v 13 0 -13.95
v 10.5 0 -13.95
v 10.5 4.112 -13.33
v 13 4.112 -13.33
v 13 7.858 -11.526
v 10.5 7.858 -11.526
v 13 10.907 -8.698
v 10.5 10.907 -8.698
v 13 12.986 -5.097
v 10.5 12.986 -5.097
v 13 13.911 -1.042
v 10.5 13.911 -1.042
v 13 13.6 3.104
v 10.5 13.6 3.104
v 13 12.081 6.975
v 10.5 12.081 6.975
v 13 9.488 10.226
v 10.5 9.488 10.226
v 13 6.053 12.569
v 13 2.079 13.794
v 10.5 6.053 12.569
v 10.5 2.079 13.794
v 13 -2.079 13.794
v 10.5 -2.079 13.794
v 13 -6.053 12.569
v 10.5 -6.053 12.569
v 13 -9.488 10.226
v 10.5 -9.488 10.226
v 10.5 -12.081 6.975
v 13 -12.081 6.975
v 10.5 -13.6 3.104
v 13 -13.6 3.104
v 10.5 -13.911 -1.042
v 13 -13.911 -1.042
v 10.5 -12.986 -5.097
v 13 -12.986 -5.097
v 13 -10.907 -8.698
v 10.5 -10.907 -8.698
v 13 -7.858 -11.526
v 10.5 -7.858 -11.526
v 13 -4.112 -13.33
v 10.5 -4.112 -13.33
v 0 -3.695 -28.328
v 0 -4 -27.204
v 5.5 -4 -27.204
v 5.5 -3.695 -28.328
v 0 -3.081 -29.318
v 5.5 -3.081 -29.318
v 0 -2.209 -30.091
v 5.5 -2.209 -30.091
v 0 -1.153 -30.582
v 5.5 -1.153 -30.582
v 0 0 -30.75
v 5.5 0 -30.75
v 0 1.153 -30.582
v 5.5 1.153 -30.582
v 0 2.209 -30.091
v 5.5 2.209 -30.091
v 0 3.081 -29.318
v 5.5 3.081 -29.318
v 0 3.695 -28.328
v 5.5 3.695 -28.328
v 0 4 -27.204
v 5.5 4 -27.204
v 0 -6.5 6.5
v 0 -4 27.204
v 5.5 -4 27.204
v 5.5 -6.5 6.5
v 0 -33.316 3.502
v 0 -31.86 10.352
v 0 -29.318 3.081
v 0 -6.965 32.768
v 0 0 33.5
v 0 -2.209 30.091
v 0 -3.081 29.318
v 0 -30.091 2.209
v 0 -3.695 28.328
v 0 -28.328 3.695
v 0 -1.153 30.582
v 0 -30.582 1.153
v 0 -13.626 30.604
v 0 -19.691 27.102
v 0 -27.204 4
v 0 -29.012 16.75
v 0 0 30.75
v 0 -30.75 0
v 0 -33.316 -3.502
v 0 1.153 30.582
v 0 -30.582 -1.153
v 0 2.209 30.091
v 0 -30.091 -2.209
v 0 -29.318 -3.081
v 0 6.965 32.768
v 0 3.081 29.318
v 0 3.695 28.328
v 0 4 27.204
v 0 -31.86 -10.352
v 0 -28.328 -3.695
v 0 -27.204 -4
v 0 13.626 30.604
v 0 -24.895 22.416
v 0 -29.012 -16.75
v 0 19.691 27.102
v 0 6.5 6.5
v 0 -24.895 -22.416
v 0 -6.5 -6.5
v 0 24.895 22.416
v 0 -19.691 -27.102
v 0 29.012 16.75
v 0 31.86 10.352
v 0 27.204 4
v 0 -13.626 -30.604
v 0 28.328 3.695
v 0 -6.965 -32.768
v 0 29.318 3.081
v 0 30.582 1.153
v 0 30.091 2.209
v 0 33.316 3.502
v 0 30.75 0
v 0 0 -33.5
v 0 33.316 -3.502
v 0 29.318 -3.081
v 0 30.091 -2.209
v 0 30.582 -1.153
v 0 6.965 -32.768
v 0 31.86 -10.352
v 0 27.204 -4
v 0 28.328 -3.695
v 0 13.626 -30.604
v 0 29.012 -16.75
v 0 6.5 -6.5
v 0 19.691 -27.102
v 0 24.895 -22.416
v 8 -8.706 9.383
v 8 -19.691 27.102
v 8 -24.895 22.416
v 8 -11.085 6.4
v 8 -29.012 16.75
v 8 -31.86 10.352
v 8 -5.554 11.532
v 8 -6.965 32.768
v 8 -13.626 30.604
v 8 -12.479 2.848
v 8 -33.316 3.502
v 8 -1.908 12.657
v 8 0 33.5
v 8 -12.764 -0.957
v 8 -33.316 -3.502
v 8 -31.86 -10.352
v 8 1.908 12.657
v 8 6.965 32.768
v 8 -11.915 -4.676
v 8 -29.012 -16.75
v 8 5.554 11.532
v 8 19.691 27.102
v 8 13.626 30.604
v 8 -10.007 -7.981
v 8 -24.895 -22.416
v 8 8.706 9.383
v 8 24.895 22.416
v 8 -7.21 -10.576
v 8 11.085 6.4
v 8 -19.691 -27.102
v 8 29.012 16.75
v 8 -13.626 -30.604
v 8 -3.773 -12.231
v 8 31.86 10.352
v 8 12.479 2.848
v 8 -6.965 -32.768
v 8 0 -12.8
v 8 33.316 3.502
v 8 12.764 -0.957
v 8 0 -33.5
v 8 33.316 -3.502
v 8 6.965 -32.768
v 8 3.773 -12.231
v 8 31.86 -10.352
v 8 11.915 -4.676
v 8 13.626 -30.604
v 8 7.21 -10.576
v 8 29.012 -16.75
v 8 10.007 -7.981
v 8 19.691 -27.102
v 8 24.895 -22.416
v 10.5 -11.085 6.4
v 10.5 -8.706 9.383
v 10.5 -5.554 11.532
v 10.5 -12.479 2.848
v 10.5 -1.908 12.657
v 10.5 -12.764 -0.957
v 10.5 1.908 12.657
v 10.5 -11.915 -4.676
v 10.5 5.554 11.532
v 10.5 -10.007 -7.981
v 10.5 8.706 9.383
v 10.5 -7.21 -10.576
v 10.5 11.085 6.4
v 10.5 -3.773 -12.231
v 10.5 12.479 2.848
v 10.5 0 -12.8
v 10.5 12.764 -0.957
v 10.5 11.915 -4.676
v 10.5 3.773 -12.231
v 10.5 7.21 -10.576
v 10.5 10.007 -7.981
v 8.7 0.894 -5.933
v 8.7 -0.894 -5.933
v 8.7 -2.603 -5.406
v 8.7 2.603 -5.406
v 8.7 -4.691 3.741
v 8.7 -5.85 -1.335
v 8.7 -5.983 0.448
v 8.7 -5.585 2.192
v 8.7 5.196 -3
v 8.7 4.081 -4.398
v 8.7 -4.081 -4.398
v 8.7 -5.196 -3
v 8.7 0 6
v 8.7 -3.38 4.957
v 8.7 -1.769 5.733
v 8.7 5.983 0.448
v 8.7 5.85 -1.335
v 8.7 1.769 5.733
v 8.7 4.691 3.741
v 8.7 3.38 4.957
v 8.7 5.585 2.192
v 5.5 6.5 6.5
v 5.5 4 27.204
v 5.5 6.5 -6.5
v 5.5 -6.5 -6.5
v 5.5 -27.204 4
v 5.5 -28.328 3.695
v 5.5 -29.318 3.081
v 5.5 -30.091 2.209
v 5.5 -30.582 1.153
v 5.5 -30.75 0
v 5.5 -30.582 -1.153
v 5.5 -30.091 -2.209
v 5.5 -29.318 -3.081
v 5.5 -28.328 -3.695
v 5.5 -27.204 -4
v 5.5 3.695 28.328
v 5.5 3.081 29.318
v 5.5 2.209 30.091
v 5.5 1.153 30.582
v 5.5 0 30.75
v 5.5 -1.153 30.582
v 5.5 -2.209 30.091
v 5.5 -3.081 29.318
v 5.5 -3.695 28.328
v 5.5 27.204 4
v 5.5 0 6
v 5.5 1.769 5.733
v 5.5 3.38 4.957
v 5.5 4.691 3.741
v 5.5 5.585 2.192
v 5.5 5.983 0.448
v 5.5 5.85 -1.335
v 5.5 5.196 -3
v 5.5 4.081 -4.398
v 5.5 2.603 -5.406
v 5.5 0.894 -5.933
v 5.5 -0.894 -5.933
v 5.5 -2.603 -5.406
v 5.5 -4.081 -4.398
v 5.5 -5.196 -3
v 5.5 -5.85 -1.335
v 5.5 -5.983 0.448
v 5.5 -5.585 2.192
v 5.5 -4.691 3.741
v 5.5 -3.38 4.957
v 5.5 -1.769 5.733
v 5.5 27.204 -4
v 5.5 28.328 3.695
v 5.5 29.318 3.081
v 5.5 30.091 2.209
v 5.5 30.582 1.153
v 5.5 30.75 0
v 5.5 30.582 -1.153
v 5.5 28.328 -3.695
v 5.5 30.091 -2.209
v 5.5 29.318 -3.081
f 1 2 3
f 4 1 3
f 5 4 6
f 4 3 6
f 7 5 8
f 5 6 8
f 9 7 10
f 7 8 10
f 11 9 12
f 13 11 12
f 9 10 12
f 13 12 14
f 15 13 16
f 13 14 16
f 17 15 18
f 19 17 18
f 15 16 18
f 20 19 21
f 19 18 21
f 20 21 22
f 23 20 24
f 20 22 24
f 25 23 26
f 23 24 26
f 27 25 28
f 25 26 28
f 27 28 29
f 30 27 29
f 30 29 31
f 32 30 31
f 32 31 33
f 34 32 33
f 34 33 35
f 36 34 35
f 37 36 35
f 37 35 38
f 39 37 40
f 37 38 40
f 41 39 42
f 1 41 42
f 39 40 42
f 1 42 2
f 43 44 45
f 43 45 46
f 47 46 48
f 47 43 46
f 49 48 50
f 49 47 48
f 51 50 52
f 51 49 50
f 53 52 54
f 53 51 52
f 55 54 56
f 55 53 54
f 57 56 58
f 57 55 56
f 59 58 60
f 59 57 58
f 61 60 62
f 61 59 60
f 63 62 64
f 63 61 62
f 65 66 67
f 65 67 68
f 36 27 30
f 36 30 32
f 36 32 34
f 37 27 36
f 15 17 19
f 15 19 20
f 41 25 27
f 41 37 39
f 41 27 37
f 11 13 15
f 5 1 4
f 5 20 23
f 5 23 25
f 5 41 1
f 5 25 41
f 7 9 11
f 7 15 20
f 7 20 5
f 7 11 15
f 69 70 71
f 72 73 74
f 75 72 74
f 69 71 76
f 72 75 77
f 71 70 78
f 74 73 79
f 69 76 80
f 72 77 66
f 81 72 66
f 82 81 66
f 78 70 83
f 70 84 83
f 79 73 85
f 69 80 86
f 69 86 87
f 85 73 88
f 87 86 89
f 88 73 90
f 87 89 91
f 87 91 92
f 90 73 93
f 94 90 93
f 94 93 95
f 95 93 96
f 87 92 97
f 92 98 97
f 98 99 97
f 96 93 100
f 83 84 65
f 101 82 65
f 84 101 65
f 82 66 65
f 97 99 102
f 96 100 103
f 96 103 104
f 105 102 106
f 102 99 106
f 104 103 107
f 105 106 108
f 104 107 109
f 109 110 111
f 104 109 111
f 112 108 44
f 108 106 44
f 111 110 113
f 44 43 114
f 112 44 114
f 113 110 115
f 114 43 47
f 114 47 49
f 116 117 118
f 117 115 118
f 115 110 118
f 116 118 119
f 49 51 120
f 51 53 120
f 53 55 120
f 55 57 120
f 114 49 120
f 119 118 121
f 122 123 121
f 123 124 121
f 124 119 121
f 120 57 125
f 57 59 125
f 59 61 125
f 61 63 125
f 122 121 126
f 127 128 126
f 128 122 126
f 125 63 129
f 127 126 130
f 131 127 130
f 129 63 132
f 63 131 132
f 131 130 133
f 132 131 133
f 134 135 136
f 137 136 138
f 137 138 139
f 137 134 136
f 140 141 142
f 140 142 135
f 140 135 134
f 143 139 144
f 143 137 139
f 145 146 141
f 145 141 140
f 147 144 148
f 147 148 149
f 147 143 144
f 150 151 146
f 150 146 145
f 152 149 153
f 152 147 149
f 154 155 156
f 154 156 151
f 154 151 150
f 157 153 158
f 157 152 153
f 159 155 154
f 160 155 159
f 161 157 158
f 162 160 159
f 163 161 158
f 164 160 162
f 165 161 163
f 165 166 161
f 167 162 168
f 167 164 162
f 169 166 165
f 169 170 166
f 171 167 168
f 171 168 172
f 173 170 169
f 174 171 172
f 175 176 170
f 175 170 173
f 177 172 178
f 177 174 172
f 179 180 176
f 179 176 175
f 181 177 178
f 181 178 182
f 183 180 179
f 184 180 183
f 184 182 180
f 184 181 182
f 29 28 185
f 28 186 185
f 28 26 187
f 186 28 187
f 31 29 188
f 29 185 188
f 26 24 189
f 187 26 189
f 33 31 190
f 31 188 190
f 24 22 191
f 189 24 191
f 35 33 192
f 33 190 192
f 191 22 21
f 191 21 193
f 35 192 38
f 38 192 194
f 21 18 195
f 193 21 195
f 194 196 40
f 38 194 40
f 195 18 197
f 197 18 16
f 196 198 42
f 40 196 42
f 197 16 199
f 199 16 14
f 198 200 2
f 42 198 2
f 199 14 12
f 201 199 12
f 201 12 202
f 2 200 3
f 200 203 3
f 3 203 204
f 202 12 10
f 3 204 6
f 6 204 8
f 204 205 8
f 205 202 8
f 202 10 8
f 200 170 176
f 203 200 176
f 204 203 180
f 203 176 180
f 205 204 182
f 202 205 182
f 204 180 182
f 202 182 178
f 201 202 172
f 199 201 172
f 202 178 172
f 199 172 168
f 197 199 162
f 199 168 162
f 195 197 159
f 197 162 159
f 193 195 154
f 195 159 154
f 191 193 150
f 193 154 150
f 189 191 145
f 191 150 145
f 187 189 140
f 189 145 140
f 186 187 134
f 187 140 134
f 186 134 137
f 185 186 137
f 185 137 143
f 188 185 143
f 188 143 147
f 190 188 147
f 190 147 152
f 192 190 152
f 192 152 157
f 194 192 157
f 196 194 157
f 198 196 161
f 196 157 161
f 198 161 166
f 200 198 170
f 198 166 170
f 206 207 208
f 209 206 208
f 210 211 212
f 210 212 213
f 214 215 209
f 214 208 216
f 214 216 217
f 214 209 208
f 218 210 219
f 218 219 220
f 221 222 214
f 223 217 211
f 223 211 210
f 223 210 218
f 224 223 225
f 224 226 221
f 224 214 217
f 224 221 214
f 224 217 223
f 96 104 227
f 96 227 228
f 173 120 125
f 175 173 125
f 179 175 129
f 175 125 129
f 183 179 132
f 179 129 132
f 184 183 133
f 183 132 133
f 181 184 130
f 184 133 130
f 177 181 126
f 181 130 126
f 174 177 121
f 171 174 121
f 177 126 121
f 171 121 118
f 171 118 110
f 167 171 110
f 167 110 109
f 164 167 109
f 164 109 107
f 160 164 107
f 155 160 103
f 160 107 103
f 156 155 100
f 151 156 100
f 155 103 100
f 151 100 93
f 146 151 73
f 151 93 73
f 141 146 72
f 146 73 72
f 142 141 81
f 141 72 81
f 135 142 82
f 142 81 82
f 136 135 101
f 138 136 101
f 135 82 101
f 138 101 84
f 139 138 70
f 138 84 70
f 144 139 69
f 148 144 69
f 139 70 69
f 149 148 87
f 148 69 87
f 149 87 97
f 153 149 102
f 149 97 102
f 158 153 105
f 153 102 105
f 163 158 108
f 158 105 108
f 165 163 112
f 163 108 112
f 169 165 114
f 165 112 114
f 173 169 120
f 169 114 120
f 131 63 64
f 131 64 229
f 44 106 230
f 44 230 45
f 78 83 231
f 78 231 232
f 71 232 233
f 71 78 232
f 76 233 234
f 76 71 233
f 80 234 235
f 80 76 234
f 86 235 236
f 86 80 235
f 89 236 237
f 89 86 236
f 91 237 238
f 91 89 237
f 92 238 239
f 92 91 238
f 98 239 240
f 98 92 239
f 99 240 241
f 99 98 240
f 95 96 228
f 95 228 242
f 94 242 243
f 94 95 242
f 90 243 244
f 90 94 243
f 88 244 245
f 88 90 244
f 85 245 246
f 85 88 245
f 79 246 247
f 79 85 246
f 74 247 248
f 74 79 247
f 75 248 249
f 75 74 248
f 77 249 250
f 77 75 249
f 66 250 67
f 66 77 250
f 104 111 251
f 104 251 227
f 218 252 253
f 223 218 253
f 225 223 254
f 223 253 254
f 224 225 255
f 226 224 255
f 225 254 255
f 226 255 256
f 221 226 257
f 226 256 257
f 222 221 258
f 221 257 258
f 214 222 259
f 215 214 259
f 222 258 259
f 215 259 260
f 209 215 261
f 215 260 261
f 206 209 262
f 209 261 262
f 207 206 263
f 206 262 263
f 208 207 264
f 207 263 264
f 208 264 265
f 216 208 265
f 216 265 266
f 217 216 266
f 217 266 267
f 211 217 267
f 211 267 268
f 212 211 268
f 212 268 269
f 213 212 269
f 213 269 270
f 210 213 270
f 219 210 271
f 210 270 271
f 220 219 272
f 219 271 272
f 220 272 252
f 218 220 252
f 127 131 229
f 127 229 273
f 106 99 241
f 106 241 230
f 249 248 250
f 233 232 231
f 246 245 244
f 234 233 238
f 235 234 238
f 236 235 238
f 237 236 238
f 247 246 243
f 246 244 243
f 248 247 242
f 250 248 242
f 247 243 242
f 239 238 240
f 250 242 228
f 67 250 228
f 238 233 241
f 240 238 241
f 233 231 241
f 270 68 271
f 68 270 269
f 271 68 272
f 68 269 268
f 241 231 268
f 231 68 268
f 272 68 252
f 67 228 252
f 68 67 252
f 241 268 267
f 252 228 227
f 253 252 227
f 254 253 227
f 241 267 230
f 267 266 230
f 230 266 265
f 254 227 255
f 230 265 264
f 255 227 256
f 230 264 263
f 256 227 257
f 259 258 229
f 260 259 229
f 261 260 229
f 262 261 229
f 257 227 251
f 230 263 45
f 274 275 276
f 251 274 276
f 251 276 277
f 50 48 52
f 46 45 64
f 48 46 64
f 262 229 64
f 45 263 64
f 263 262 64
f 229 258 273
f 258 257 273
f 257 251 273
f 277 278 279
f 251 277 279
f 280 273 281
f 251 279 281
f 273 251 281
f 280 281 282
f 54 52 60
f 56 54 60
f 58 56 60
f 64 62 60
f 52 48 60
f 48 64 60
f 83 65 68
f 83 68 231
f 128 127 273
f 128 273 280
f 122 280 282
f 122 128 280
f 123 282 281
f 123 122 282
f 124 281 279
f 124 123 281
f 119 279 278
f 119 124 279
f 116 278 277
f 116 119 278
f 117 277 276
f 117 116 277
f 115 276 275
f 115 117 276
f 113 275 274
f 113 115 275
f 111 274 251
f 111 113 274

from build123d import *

# Parameters (mm, degrees)
SKETCH2_R           = 33.5
BOSS_EXTRUDE1_DEPTH = 8
SKETCH7_R           = 12.8
BOSS_EXTRUDE2_DEPTH = 2.5
SKETCH8_R           = 13.95
BOSS_EXTRUDE3_DEPTH = 2.5
CUT_EXTRUDE1_DEPTH  = 5.5
SKETCH11_R          = 6
CUT_EXTRUDE2_DEPTH  = 3.2


with BuildPart() as part:
    # Sketch2 → Boss-Extrude1 (new body)
    with BuildSketch(Plane(origin=(0, 0, 0), x_dir=(0, 0, -1), z_dir=(1, 0, 0))):
        Circle(SKETCH2_R)
    extrude(amount=BOSS_EXTRUDE1_DEPTH)

    # Sketch7 → Boss-Extrude2 (add)
    with BuildSketch(Plane(origin=(8, 0, 0), x_dir=(0, 0, -1), z_dir=(1, 0, 0))):
        Circle(SKETCH7_R)
    extrude(amount=BOSS_EXTRUDE2_DEPTH)

    # Sketch8 → Boss-Extrude3 (add)
    with BuildSketch(Plane(origin=(10.5, 0, 0), x_dir=(0, 0, -1), z_dir=(1, 0, 0))):
        Circle(SKETCH8_R)
    extrude(amount=BOSS_EXTRUDE3_DEPTH)

    # Sketch10 → Cut-Extrude1 (cut)
    with BuildSketch(Plane.ZY):
        with BuildLine():
            Line((-4, -27.203944189), (-6.5, -6.5))
            Line((-6.5, -6.5), (-27.203944189, -4))
            ThreePointArc((-27.203944189, -4), (-30.75, 0), (-27.203944189, 4))
            Line((-27.203944189, 4), (-6.5, 6.5))
            Line((-6.5, 6.5), (-4, 27.203944189))
            ThreePointArc((-4, 27.203944189), (0, 30.75), (4, 27.203944189))
            Line((4, 27.203944189), (6.5, 6.5))
            Line((6.5, 6.5), (27.203944189, 4))
            ThreePointArc((27.203944189, 4), (30.75, 0), (27.203944189, -4))
            Line((27.203944189, -4), (6.5, -6.5))
            Line((6.5, -6.5), (4, -27.203944189))
            ThreePointArc((4, -27.203944189), (0, -30.75), (-4, -27.203944189))
        make_face()
    extrude(amount=-CUT_EXTRUDE1_DEPTH, mode=Mode.SUBTRACT)

    # Sketch11 → Cut-Extrude2 (cut)
    with BuildSketch(Plane.ZY.offset(-5.5)):
        Circle(SKETCH11_R)
    extrude(amount=-CUT_EXTRUDE2_DEPTH, mode=Mode.SUBTRACT)


solid = part.part
